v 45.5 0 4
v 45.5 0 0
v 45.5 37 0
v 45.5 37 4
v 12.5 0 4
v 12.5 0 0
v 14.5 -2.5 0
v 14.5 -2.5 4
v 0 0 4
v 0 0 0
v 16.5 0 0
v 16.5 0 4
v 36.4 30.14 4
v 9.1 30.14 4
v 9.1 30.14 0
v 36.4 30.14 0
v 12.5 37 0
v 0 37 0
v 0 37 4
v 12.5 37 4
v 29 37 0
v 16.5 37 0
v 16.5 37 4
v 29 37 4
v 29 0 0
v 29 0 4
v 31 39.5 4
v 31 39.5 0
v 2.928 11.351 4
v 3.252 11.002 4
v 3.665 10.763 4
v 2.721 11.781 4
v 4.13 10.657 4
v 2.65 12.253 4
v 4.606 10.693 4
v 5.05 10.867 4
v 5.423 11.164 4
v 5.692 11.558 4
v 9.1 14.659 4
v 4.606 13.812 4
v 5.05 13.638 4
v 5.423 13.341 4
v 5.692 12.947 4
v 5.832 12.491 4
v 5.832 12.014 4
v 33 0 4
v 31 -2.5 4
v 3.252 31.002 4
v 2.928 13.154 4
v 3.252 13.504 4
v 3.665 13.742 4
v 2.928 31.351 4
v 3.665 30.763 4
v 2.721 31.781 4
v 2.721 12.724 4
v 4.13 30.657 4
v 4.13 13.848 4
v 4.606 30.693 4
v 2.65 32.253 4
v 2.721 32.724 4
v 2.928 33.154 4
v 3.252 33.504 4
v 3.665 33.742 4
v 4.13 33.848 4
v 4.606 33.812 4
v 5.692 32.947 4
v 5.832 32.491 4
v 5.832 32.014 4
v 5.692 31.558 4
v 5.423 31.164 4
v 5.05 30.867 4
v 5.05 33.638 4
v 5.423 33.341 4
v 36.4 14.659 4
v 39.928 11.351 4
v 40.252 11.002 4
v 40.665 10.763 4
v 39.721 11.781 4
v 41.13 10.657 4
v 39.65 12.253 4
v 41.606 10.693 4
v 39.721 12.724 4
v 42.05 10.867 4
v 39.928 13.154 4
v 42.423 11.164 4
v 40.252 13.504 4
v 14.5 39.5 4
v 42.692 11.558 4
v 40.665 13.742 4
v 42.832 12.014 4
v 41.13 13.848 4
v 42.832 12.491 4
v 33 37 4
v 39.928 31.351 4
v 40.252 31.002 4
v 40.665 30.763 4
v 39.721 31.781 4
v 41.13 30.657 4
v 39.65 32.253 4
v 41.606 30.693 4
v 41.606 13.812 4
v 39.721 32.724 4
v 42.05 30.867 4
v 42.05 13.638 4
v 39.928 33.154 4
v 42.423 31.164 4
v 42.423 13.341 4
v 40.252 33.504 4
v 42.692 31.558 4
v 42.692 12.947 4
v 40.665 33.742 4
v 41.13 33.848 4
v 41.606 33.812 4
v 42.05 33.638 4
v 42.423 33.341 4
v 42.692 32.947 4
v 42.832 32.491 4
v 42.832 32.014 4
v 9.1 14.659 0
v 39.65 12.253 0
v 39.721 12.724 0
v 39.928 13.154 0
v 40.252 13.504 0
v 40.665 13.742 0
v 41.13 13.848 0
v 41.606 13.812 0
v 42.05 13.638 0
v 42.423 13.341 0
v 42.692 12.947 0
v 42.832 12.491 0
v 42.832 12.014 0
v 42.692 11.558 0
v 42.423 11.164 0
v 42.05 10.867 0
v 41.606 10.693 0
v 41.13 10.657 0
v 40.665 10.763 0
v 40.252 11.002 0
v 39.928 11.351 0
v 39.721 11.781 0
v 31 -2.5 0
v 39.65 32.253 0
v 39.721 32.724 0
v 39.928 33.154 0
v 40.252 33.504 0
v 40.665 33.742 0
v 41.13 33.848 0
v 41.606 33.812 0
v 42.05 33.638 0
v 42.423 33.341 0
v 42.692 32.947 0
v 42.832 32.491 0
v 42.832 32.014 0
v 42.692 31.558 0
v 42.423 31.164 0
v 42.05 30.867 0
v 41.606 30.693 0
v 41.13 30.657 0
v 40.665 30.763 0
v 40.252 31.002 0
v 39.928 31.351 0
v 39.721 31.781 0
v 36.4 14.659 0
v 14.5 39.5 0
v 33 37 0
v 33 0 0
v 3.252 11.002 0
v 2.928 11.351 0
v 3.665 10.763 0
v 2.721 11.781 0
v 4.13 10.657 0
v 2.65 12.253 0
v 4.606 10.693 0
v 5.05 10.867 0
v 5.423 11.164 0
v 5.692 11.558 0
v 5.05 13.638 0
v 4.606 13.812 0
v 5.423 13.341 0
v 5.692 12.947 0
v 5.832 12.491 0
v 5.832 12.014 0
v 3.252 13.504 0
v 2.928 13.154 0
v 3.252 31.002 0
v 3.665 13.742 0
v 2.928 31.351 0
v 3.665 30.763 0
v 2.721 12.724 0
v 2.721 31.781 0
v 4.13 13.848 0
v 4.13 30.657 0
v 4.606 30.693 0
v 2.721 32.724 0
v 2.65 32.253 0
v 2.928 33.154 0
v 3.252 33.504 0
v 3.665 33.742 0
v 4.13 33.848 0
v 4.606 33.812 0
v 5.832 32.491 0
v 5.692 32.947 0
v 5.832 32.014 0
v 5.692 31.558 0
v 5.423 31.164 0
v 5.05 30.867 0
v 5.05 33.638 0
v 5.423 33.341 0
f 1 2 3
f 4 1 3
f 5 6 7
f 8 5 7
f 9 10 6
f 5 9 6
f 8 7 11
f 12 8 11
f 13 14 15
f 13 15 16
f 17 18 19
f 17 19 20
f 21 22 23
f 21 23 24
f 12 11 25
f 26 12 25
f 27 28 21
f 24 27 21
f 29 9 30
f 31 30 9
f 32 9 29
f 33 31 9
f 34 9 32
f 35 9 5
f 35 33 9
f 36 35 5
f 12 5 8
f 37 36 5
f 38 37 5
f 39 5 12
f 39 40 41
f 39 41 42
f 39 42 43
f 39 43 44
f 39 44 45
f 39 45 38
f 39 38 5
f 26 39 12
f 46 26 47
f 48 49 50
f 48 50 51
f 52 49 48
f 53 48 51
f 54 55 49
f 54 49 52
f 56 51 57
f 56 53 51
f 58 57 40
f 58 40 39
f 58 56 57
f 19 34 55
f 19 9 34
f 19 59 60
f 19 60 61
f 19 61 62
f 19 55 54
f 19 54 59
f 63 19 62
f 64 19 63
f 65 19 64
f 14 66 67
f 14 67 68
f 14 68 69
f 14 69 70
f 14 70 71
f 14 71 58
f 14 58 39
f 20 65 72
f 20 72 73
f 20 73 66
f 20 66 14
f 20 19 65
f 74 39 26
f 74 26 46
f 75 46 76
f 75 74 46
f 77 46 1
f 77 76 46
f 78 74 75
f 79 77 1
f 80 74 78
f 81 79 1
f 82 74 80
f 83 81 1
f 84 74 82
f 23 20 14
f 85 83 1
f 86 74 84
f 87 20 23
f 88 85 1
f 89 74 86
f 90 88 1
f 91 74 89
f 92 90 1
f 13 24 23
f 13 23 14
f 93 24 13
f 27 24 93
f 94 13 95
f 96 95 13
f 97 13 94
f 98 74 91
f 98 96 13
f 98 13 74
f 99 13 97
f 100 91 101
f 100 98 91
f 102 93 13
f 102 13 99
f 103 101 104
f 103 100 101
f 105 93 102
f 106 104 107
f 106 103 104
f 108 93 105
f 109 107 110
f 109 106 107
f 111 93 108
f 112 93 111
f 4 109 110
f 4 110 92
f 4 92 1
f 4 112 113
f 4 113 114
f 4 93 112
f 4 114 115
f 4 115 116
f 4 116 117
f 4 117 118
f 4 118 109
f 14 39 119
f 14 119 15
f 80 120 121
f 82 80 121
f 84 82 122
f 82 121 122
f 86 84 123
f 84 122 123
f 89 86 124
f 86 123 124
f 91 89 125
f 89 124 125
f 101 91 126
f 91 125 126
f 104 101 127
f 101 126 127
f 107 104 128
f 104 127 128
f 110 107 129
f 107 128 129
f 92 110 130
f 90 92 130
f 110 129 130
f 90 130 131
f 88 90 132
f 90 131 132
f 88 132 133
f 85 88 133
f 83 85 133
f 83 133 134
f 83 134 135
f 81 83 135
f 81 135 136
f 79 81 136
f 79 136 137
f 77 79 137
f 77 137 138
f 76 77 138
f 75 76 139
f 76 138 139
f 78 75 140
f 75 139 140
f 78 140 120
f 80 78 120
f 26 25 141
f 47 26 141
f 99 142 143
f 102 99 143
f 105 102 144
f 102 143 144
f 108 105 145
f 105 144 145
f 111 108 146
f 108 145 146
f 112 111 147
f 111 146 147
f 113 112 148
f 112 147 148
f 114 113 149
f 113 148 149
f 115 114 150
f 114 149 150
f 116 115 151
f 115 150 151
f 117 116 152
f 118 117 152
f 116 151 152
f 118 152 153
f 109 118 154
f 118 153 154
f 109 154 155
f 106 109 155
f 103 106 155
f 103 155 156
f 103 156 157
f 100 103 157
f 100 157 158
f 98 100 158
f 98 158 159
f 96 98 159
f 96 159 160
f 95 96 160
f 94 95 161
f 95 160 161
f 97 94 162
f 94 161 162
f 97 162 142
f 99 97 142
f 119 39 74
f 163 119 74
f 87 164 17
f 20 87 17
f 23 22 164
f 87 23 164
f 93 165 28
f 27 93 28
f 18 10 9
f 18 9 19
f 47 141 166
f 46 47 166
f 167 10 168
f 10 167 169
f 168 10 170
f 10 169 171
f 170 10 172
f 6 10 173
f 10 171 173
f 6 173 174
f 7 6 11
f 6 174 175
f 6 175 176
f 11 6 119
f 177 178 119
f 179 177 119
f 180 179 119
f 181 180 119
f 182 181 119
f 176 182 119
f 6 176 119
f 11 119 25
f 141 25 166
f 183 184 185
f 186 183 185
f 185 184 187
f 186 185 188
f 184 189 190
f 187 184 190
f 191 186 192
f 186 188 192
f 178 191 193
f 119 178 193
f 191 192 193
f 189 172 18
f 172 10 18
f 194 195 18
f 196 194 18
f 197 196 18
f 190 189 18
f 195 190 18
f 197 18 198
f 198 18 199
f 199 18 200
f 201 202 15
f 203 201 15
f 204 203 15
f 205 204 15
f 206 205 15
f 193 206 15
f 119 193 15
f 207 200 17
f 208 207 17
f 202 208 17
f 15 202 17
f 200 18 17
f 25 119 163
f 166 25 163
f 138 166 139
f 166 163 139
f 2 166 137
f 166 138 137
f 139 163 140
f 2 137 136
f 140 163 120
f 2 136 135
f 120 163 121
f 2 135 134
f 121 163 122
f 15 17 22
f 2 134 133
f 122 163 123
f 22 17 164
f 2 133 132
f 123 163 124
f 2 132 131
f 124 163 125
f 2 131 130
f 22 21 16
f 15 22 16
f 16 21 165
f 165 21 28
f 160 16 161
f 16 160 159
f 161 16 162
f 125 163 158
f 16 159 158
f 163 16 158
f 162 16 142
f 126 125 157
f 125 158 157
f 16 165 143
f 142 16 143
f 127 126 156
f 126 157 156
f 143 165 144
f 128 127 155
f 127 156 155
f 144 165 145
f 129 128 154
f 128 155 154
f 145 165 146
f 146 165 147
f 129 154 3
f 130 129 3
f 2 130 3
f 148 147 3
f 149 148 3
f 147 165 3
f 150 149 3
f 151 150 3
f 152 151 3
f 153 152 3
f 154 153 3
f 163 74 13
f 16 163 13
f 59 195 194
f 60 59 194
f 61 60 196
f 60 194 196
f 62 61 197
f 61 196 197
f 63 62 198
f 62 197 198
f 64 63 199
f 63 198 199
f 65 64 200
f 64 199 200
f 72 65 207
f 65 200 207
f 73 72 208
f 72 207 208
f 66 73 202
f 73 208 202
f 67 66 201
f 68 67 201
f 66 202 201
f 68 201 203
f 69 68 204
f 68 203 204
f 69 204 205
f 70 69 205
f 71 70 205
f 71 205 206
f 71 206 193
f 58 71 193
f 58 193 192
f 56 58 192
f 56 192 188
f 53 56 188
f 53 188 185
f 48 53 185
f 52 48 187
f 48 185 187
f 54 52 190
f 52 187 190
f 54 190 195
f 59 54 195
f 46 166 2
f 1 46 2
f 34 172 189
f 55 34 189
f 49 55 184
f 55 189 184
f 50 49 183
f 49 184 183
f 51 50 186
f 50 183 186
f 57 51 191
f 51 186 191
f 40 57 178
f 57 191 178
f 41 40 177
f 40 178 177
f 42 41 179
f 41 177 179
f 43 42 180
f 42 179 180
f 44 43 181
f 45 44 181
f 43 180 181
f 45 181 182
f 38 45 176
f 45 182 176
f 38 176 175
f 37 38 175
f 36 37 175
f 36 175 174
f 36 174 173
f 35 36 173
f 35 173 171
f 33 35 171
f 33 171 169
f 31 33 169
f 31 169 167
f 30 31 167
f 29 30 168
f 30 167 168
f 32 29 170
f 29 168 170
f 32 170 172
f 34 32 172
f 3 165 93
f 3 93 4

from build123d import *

# Parameters (mm, degrees)
SKETCH1_W              = 45.5
SKETCH1_H              = 37
BASIS_DEPTH            = 4
SKETCH6_W              = 27.3
SKETCH6_H              = 15.480915405
SHOW_ONLY_SCREEN_DEPTH = 10.04
SKETCH11_R             = 1.6
CUT_EXTRUDE10_DEPTH    = 4


with BuildPart() as part:
    # Sketch1 → Basis (new body)
    with BuildSketch(Plane.XY):
        with Locations((22.75, 18.5)):
            Rectangle(SKETCH1_W, SKETCH1_H)
        Polygon((14.5, 39.5), (12.5, 37), (16.5, 37), align=None)
        Polygon((31, 39.5), (29, 37), (33, 37), align=None)
        Polygon((16.5, 0), (12.5, 0), (14.5, -2.5), align=None)
        Polygon((33, 0), (29, 0), (31, -2.5), align=None)
    extrude(amount=BASIS_DEPTH)

    # Sketch6 → Show only screen (cut)
    with BuildSketch(Plane.XY.offset(4)):
        with Locations((22.75, 22.399542298)):
            Rectangle(SKETCH6_W, SKETCH6_H)
    extrude(amount=-SHOW_ONLY_SCREEN_DEPTH, mode=Mode.SUBTRACT)

    # Sketch11 → Cut-Extrude10 (cut)
    with BuildSketch(Plane(origin=(0, 0, 0), x_dir=(-1, 0, 0), z_dir=(0, 0, -1))):
        with Locations((-41.25, 32.252592082)):
            Circle(SKETCH11_R)
        with Locations((-4.25, 32.252592082)):
            Circle(SKETCH11_R)
        with Locations((-4.25, 12.252592082)):
            Circle(SKETCH11_R)
        with Locations((-41.25, 12.252592082)):
            Circle(SKETCH11_R)
    extrude(amount=-CUT_EXTRUDE10_DEPTH, mode=Mode.SUBTRACT)


solid = part.part
